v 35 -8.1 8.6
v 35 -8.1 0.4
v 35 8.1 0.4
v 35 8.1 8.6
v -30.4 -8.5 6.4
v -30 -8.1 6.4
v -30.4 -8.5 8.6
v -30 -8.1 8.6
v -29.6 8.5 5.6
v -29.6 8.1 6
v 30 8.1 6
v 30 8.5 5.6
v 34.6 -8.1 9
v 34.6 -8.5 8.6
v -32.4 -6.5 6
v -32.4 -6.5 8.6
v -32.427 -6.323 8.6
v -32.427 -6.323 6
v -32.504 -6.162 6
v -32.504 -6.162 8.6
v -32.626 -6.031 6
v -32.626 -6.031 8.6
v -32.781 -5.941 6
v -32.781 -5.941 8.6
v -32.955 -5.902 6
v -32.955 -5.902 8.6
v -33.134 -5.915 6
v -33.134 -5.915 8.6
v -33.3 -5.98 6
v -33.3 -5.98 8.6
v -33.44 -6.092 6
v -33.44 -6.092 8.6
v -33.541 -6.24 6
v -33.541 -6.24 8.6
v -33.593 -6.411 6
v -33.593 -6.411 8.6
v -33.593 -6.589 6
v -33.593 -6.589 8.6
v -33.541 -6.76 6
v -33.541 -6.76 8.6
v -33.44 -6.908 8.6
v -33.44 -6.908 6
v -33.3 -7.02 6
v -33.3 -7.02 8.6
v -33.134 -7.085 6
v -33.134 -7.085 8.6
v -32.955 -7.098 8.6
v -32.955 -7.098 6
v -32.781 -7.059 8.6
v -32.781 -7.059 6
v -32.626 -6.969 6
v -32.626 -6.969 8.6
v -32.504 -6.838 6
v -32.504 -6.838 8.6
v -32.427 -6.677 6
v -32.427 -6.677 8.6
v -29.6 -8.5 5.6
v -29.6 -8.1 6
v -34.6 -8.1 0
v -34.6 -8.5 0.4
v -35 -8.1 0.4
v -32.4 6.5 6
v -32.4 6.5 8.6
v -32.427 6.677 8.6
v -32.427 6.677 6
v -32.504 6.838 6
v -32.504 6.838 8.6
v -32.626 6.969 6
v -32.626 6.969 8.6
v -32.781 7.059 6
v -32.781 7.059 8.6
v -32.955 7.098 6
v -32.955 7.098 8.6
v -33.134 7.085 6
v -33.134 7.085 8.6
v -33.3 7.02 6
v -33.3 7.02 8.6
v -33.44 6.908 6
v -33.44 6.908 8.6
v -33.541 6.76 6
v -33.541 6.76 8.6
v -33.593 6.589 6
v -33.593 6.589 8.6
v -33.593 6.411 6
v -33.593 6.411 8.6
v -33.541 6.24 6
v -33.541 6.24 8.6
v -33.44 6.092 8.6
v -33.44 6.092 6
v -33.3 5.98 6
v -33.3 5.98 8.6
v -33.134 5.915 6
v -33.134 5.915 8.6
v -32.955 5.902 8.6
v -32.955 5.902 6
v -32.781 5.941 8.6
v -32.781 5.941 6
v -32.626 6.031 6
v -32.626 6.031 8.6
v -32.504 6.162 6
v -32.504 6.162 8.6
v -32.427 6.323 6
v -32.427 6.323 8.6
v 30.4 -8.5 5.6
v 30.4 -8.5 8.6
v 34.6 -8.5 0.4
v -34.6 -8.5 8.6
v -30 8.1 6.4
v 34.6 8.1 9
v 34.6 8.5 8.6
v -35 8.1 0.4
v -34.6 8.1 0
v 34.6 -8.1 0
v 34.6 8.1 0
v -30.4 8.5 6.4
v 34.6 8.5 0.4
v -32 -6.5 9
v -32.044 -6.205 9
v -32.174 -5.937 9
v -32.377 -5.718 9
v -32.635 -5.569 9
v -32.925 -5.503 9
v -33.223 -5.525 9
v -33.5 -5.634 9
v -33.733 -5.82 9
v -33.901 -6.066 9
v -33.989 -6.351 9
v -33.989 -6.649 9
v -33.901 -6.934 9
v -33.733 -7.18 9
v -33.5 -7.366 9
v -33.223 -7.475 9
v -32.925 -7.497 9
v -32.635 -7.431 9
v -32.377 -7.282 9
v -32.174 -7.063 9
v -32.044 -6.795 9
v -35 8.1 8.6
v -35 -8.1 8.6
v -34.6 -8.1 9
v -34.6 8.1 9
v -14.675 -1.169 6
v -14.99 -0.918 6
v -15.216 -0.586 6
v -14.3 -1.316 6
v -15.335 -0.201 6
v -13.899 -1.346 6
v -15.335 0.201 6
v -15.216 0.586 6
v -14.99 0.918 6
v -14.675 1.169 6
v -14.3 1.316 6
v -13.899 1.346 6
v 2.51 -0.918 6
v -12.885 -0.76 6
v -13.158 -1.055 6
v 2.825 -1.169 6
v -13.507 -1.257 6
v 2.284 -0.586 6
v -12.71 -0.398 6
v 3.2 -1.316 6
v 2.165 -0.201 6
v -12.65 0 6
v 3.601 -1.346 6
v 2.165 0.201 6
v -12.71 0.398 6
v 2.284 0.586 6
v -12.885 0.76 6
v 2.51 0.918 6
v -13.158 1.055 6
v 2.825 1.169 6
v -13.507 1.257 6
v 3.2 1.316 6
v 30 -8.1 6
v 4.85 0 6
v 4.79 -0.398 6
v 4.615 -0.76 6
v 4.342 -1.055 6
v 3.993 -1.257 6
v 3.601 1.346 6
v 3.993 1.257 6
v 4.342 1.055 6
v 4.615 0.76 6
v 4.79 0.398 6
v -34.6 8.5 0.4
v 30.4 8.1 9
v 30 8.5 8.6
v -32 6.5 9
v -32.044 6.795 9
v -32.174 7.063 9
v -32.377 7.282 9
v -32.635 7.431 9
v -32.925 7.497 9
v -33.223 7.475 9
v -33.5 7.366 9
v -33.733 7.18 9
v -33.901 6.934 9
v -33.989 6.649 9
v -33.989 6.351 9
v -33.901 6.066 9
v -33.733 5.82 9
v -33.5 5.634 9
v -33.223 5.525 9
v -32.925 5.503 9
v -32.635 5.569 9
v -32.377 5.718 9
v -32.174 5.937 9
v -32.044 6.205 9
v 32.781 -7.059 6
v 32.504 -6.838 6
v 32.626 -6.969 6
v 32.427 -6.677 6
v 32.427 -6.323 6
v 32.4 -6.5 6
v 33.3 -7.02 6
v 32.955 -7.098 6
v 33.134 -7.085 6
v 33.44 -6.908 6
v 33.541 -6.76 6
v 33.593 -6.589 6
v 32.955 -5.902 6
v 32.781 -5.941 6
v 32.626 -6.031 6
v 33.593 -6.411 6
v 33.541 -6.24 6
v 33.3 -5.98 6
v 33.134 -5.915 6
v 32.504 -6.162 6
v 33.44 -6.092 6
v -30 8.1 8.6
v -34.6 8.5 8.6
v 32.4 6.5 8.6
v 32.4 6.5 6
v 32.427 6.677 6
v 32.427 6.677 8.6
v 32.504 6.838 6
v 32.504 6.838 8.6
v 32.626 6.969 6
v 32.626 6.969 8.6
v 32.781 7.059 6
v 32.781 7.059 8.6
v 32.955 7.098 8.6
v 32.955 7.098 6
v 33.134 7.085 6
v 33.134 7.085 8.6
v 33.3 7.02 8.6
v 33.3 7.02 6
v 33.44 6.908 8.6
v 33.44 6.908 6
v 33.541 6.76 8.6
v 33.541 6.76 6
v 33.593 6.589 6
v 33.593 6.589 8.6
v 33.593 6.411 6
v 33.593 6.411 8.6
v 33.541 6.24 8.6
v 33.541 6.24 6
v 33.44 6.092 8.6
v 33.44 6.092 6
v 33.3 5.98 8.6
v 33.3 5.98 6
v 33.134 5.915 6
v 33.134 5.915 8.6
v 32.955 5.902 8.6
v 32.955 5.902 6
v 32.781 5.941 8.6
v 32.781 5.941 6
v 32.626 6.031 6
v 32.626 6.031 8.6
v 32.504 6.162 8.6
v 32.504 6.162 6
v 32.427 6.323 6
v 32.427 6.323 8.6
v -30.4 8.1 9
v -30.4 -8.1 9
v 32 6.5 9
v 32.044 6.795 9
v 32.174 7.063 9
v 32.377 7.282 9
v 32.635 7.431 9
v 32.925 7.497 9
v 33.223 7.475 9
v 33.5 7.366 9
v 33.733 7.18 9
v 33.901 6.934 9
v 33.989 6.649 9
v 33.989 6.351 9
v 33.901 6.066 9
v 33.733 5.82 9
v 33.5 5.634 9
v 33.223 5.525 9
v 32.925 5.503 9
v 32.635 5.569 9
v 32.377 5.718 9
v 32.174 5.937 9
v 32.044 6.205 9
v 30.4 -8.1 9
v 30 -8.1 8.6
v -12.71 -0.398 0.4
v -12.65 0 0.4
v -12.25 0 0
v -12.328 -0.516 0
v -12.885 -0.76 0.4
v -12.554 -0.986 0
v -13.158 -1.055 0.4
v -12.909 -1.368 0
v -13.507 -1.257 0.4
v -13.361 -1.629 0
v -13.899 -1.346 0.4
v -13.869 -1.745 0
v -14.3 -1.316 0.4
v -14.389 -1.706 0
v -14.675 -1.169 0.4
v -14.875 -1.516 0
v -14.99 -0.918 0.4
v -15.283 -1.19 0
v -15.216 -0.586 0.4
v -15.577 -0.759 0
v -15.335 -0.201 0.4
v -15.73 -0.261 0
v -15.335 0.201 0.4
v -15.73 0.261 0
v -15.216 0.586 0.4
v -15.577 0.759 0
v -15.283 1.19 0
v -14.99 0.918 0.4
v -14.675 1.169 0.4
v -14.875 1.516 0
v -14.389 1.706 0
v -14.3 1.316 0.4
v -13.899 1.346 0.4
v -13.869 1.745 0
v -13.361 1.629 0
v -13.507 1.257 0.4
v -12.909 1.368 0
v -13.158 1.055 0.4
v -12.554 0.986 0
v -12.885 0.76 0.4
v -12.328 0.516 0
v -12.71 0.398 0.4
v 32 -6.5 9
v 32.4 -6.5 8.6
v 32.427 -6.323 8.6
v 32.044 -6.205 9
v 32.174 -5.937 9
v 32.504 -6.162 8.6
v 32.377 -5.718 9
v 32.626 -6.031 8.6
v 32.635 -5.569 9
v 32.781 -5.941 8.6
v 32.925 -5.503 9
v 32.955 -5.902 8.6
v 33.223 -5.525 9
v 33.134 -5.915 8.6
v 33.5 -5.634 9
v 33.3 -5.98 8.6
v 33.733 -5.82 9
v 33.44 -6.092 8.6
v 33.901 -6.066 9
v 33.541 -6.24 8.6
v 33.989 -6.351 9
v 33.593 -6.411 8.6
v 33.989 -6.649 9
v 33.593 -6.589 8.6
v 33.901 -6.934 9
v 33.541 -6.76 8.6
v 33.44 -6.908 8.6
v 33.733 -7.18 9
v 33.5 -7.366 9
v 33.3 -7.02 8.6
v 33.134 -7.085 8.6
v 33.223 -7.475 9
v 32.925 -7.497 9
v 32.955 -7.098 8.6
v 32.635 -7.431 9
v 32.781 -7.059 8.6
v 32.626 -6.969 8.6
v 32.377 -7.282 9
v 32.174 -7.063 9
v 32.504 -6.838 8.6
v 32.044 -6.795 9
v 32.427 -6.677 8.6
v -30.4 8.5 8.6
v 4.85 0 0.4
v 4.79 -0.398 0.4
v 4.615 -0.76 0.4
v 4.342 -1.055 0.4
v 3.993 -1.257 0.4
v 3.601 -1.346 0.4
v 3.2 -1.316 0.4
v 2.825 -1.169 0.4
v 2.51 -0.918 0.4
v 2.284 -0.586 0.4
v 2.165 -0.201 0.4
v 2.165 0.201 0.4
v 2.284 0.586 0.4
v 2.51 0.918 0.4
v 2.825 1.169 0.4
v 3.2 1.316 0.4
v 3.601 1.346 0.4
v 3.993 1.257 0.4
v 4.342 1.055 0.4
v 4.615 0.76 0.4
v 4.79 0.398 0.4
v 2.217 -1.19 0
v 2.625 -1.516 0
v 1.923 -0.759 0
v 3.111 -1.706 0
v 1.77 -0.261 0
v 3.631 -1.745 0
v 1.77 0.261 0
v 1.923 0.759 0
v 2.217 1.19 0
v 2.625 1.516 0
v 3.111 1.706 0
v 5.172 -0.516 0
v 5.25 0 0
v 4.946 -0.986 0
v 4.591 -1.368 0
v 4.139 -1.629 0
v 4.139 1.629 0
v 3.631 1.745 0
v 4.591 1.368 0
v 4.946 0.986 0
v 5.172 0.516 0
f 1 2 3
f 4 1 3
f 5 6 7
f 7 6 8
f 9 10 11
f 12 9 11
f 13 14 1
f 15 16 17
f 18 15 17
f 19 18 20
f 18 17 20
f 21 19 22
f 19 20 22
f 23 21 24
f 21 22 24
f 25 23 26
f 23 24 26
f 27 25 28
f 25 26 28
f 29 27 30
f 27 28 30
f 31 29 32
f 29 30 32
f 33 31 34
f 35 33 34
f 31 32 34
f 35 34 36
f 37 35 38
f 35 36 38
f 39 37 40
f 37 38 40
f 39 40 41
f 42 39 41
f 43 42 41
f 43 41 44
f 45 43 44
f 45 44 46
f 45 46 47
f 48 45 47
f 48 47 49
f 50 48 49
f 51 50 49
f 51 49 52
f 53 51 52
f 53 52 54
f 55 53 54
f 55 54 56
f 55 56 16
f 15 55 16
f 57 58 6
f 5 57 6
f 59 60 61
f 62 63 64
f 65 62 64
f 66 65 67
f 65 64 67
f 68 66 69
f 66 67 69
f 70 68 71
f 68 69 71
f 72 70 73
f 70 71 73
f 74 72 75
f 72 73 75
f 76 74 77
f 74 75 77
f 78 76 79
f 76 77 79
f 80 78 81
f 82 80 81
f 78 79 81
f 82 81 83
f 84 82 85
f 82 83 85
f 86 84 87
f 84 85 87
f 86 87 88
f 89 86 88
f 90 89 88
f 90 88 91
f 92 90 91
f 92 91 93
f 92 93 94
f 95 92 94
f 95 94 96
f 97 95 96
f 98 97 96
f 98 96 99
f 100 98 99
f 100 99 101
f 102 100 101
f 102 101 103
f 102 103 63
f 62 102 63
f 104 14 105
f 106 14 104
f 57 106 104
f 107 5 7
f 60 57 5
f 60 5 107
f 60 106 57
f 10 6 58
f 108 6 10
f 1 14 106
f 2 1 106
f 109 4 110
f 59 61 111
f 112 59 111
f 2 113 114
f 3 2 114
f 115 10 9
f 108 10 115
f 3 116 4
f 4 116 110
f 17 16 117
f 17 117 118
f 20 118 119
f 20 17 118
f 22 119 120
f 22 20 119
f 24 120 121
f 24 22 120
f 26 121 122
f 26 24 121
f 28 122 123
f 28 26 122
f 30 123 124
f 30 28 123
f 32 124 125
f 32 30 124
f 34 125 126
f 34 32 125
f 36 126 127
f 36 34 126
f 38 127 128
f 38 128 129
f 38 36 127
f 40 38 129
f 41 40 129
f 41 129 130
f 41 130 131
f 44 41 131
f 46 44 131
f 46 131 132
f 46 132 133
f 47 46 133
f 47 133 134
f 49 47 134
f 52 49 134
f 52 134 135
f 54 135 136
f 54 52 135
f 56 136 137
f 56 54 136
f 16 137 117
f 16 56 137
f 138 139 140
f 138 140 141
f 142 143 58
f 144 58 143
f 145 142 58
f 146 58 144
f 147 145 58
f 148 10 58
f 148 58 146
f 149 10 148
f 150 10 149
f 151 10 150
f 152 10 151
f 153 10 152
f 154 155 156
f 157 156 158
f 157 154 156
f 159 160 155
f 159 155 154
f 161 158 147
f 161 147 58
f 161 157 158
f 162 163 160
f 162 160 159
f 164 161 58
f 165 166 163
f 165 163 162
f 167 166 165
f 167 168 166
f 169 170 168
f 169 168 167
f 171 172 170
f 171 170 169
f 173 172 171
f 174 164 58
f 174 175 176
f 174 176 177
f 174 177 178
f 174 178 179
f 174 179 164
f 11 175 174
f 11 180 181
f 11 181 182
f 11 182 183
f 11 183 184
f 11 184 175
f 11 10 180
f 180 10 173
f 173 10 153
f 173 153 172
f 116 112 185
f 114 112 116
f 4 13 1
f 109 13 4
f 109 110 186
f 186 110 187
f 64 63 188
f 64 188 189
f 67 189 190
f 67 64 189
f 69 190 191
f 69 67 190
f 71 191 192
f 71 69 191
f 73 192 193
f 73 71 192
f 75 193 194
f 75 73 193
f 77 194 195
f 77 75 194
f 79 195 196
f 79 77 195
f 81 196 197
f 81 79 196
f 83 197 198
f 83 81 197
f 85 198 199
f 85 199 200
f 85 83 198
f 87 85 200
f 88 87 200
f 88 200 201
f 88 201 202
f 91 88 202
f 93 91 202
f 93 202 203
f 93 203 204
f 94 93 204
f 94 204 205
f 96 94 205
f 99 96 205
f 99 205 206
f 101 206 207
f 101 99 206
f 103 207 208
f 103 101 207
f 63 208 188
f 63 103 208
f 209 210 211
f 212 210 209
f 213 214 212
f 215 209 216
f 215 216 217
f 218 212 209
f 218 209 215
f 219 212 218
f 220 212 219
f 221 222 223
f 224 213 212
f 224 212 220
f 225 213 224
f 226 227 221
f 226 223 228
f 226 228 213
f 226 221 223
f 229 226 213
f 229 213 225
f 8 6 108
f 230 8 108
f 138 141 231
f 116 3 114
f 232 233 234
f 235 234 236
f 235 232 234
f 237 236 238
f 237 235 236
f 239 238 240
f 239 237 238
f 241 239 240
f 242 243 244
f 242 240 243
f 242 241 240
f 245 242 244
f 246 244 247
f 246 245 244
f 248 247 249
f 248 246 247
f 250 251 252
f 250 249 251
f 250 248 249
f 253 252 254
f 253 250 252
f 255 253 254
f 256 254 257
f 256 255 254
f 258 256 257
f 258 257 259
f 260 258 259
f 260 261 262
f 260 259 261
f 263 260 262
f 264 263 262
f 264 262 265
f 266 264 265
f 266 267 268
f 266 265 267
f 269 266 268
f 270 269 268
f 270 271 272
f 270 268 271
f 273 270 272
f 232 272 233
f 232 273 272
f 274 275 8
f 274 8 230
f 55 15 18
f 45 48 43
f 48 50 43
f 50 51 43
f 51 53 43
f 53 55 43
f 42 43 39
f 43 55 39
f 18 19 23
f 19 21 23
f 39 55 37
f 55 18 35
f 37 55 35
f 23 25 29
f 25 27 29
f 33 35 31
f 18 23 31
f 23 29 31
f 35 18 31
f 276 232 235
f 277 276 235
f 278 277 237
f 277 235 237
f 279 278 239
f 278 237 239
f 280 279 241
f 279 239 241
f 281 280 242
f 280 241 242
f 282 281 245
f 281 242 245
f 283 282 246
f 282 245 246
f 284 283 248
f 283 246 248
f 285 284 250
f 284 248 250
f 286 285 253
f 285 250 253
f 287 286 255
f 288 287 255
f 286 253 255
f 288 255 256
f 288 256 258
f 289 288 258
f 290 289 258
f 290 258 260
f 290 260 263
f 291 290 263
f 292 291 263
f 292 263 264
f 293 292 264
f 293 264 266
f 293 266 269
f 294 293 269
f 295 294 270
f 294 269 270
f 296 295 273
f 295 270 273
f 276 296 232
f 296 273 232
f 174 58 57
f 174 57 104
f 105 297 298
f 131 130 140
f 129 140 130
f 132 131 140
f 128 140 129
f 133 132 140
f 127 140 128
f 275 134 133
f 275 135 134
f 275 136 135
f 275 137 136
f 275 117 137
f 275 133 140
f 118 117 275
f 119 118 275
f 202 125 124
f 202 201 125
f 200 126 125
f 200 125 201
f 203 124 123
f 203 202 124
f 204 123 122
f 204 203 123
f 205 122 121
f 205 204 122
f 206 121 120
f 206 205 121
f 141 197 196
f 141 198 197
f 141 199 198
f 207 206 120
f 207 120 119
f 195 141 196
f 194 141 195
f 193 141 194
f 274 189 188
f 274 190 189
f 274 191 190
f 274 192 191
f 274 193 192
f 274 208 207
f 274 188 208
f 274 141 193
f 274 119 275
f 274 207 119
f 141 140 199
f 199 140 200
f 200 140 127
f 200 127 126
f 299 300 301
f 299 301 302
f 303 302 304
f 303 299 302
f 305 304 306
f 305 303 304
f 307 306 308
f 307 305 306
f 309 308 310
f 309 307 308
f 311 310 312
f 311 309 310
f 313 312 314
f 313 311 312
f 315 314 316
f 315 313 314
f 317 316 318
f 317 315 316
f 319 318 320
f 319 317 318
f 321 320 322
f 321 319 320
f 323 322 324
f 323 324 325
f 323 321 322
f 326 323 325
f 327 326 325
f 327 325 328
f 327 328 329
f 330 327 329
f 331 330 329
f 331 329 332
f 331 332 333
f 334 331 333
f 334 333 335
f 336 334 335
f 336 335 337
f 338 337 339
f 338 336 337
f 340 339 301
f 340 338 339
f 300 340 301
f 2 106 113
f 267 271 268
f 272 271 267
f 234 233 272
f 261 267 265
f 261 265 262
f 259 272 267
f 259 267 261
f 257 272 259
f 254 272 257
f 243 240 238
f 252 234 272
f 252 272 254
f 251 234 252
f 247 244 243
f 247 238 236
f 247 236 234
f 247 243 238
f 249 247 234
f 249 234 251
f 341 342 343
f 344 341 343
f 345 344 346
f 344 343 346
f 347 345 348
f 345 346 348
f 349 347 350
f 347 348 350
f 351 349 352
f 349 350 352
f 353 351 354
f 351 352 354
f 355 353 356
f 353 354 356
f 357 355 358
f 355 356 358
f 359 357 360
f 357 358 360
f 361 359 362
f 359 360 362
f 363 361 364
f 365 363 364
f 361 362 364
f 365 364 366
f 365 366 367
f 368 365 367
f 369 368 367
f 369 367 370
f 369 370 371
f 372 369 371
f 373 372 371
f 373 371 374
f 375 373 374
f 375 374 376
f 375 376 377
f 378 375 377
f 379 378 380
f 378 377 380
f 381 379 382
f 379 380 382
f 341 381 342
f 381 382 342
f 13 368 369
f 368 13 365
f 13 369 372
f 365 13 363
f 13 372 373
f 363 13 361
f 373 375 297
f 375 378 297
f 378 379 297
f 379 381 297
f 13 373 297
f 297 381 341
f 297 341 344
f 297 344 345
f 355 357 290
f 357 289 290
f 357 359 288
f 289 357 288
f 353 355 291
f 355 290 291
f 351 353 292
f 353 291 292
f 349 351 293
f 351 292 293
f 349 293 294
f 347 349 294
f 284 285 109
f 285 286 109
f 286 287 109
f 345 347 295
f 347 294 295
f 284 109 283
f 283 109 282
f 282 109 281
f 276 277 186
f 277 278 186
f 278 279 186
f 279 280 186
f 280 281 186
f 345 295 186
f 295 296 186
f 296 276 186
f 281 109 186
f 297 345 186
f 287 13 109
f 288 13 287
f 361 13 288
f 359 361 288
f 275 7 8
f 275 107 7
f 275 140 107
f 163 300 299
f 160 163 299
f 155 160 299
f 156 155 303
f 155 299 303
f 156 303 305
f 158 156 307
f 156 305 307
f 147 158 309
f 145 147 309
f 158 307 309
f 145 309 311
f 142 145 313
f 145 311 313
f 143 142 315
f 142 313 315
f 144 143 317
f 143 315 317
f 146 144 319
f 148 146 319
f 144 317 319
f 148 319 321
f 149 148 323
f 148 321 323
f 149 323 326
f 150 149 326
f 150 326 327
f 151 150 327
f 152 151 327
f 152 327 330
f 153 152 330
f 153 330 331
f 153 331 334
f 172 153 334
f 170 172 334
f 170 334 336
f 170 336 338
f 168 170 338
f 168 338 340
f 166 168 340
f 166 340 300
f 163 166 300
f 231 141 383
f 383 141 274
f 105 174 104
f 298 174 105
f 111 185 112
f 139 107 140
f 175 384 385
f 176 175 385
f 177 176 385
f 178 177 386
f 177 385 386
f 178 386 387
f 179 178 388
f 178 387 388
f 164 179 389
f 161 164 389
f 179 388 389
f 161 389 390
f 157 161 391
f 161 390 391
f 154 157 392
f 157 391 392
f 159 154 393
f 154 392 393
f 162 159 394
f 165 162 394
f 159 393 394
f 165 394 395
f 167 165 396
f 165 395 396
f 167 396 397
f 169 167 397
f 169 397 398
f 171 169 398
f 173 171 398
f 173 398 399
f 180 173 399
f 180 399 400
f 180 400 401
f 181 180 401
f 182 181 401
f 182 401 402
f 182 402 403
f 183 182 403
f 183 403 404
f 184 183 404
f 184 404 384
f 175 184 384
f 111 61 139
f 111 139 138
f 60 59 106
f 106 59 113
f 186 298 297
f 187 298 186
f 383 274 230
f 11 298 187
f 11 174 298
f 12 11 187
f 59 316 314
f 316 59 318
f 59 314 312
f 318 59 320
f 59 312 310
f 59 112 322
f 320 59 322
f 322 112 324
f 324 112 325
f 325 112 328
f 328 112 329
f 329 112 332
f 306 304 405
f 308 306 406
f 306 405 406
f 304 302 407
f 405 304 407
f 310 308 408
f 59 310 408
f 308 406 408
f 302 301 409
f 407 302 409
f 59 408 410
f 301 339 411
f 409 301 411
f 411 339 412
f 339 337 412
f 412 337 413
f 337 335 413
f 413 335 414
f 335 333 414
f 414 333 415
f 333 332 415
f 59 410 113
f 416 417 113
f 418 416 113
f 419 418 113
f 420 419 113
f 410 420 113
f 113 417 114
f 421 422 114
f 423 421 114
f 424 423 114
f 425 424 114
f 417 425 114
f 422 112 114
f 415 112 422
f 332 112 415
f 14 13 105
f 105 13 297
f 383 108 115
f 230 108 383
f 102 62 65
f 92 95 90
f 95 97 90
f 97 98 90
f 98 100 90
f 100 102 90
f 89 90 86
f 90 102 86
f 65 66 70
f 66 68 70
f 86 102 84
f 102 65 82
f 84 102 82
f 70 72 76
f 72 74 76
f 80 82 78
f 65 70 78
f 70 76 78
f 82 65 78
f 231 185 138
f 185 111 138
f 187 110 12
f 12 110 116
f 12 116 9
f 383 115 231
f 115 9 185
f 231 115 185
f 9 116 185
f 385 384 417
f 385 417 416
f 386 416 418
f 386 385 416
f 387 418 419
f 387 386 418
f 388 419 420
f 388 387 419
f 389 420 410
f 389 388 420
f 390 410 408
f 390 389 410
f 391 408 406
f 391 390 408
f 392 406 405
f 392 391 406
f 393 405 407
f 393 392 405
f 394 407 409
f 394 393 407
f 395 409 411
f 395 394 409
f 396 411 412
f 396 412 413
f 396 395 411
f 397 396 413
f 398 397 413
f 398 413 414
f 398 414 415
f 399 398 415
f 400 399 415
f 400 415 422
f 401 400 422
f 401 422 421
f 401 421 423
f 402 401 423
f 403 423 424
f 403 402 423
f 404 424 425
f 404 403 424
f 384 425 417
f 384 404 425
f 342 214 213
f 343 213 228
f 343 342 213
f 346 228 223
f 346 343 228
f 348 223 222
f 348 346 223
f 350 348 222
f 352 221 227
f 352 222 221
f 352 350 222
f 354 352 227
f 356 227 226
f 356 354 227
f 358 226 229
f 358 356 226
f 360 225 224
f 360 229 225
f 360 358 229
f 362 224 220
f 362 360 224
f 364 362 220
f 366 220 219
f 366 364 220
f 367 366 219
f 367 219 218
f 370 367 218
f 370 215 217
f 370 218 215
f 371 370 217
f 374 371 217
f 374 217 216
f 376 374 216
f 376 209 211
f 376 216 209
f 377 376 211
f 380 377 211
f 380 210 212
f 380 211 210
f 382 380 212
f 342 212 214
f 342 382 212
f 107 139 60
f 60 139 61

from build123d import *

# Parameters (mm, degrees)
SKETCH_W        = 70
SKETCH_H        = 17
PAD_DEPTH       = 6
SKETCH001_W     = 5
SKETCH001_H     = 17
PAD001_DEPTH    = 3
SKETCH002_R     = 0.6
POCKET_DEPTH    = 4
SKETCH003_R     = 1.35
POCKET001_DEPTH = 9.001
CHAMFER_SIZE    = 0.4


with BuildPart() as part:
    # Sketch (on XY_Plane of Origin) → Pad (new body)
    with BuildSketch(Plane.XY):
        Rectangle(SKETCH_W, SKETCH_H)
    extrude(amount=PAD_DEPTH)

    # Sketch001 (on Face6 of Pad) → Pad001 (join)
    with BuildSketch(Plane.XY.offset(6)):
        with Locations((-32.5, 0)):
            Rectangle(SKETCH001_W, SKETCH001_H)
    extrude(amount=PAD001_DEPTH)

    # Sketch002 (on Face5 of Pad001) → Pocket (cut)
    with BuildSketch(Plane.XY.offset(9)):
        with Locations((-33, 6.5)):
            Circle(SKETCH002_R)
        with Locations((-33, -6.5)):
            Circle(SKETCH002_R)
    extrude(amount=-POCKET_DEPTH, mode=Mode.SUBTRACT)

    # Mirrored: part across YZ


with BuildPart() as part_1:
    add(part.part)
    add(part.part.mirror(Plane.YZ))

    # Sketch003 (on Face1 of Mirrored) → Pocket001 (cut, through all)
    with BuildSketch(Plane(origin=(0, 0, 0), x_dir=(1, 0, 0), z_dir=(0, 0, -1))):
        with Locations((-14, 0)):
            Circle(SKETCH003_R)
        with Locations((3.5, 0)):
            Circle(SKETCH003_R)
    extrude(amount=-POCKET001_DEPTH, mode=Mode.SUBTRACT)

    # Chamfer
    chamfer_edges = [part_1.edges().sort_by_distance(p)[0] for p in [
        (0, -8.5, 6),
        (-30, -8.5, 7.5),
        (-32.5, -8.5, 9),
        (-30, 0, 9),
        (-30, 0, 6),
        (-35, -8.5, 4.5),
        (0, -8.5, 0),
        (-35, 0, 9),
        (-32.5, 8.5, 9),
        (0, 8.5, 6),
        (-30, 8.5, 7.5),
        (32.5, -8.5, 9),
        (30, 0, 9),
        (30, -8.5, 7.5),
        (35, -8.5, 4.5),
        (35, 0, 9),
        (35, 0, 0),
        (35, 8.5, 4.5),
        (32.5, 8.5, 9),
        (33.6, 6.5, 9),
        (33.6, -6.5, 9),
        (-33.6, 6.5, 9),
        (-33.6, -6.5, 9),
        (-35, 8.5, 4.5),
        (0, 8.5, 0),
        (-35, 0, 0),
        (-15.35, 0, 0),
        (2.15, 0, 0),
    ]]
    chamfer(chamfer_edges, length=CHAMFER_SIZE)


solid = part_1.part
